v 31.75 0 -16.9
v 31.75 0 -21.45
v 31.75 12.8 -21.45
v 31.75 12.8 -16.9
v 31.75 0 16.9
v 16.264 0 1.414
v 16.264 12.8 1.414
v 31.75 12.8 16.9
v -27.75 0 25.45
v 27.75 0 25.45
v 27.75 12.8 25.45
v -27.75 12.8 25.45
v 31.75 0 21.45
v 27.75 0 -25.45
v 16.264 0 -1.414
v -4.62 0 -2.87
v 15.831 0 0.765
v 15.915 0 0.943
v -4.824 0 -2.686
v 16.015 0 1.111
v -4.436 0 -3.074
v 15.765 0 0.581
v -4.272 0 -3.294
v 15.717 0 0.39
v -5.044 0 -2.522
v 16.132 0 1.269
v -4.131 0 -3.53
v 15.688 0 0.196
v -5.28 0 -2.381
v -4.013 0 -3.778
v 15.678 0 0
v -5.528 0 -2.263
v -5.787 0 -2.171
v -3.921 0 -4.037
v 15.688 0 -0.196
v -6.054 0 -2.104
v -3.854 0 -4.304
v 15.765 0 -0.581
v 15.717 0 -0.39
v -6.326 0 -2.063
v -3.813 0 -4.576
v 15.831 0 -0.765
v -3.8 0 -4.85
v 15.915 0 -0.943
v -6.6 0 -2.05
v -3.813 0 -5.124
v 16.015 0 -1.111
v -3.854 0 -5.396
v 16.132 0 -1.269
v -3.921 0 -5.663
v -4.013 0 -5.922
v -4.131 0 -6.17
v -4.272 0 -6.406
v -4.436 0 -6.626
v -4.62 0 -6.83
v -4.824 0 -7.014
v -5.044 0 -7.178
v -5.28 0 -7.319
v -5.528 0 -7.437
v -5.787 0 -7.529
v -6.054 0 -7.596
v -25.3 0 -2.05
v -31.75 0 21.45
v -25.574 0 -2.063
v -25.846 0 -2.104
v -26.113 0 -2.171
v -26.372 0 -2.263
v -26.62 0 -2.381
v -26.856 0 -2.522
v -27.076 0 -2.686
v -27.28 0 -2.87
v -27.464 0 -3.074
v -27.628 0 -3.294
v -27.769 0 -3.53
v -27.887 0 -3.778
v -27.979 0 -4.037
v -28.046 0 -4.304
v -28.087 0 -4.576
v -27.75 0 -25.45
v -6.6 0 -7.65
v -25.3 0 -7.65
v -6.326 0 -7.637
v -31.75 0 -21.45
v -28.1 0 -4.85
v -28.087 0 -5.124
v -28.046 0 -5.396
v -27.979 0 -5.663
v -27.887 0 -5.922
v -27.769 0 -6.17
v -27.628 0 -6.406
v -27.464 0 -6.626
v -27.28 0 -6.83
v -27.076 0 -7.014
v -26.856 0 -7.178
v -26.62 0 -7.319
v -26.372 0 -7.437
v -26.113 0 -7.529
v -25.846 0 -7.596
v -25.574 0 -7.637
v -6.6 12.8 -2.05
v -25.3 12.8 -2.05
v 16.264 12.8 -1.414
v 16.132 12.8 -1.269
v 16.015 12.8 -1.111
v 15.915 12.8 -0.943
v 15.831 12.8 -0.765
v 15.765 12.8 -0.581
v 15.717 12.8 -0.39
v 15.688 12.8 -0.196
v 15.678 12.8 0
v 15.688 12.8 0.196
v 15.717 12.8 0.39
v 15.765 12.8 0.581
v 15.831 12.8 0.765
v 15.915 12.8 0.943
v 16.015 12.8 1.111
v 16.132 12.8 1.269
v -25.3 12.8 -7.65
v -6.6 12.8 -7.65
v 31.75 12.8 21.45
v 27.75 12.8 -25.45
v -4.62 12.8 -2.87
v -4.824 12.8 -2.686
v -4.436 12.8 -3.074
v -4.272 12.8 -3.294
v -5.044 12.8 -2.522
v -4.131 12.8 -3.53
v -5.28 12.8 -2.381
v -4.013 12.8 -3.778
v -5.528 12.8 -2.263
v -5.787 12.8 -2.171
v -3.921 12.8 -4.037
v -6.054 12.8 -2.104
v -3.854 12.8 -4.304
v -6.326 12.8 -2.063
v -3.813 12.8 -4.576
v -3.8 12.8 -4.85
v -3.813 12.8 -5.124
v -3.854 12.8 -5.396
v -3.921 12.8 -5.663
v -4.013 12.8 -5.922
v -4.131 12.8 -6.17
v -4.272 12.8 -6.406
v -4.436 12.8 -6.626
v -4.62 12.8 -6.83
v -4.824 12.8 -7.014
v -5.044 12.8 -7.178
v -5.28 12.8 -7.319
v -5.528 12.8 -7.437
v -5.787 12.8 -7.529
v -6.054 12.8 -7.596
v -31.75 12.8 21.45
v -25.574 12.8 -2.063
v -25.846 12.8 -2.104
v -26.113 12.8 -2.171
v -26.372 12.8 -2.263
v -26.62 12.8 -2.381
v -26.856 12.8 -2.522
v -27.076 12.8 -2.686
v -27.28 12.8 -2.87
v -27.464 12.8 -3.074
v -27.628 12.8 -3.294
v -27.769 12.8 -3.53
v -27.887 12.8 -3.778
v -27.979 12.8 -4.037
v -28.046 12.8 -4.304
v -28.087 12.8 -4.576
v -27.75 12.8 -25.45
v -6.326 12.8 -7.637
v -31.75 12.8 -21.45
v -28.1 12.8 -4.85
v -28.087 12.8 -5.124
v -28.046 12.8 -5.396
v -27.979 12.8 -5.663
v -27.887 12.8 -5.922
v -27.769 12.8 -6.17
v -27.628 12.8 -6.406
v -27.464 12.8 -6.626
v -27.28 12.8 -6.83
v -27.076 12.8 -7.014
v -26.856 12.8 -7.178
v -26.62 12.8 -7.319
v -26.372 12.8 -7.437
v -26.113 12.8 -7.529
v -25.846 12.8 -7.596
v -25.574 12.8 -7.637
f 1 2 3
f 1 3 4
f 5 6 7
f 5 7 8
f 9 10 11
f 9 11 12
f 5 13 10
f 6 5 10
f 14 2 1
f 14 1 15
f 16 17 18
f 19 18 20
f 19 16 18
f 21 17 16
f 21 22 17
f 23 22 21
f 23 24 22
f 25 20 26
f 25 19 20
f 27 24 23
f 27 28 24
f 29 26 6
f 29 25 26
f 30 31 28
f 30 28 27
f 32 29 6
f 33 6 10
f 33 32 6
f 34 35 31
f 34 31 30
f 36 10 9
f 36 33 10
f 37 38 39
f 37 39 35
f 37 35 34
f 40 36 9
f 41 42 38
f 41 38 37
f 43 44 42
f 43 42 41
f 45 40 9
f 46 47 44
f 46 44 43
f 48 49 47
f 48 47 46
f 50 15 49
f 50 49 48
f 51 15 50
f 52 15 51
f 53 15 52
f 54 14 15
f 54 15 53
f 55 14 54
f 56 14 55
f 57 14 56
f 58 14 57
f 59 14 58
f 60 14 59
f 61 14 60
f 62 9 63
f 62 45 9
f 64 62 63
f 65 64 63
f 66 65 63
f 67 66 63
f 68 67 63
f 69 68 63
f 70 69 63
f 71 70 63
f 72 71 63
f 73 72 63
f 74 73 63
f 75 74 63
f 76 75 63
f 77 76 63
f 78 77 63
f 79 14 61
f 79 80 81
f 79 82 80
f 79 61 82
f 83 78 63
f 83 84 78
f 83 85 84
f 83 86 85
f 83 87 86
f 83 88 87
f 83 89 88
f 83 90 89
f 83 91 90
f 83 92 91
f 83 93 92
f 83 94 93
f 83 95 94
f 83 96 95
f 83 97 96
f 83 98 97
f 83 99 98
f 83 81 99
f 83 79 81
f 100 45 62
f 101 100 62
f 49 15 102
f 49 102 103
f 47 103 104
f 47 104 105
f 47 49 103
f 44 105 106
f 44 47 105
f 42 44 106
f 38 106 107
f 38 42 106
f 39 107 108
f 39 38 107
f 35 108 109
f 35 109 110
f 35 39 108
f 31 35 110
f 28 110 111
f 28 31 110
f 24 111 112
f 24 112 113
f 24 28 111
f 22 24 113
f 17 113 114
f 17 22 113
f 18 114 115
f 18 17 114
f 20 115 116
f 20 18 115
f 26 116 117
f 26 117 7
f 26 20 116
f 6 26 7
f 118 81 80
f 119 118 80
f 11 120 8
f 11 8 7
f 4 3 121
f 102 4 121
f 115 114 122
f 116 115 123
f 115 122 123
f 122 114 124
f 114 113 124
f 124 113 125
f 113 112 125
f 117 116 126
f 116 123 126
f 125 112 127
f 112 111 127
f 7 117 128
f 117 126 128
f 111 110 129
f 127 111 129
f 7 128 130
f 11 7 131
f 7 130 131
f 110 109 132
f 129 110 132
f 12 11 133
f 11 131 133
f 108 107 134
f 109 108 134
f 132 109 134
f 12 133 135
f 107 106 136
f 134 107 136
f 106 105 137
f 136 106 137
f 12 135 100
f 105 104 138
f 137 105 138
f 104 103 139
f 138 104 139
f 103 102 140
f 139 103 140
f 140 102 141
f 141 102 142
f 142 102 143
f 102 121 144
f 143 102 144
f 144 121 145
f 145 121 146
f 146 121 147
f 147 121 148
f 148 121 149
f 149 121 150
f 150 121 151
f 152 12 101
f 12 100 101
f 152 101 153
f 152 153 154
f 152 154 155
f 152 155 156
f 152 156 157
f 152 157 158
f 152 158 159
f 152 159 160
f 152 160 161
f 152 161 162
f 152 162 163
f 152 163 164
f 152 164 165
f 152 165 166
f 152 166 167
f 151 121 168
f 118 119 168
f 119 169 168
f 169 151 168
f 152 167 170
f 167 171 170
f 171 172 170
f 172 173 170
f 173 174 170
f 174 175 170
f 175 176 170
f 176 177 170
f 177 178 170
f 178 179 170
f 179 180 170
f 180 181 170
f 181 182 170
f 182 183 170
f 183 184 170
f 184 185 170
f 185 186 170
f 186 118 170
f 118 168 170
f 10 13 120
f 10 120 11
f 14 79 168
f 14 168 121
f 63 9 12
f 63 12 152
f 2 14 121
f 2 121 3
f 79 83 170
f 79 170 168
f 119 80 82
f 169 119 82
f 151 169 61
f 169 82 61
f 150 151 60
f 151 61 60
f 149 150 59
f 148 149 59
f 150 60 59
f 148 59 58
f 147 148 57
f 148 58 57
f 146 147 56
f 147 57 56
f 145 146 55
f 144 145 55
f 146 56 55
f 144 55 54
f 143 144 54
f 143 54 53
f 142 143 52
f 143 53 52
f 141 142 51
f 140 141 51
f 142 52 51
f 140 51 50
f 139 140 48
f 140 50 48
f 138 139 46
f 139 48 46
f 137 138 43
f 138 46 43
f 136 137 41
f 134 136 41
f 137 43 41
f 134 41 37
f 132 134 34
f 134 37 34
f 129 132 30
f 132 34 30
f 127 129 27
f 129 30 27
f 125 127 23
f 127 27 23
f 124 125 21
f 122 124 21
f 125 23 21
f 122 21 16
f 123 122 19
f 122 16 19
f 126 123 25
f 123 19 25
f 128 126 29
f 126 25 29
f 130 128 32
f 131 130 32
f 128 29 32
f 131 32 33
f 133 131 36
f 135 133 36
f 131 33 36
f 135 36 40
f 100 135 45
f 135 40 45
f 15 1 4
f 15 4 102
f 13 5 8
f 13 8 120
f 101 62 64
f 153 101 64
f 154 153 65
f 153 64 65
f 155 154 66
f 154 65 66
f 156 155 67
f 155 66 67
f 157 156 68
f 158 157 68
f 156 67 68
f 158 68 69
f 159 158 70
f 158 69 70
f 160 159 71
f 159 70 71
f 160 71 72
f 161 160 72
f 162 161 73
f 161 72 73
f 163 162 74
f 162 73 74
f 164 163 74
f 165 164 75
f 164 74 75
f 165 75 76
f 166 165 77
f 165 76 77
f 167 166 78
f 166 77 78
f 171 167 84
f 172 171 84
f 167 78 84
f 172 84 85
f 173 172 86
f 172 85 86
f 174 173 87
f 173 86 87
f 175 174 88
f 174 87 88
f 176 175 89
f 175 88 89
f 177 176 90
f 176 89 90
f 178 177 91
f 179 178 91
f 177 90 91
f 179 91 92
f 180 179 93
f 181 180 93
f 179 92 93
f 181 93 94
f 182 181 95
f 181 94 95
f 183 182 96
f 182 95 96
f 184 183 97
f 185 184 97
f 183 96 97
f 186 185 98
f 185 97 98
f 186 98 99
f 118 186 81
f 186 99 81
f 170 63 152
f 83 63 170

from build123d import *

# Parameters (mm, degrees)
RESSALTO_EXTRUS_O2_DEPTH = 12.8


with BuildPart() as part:
    # Esboço1 → Ressalto-extrusão2 (new body)
    with BuildSketch(Plane(origin=(0, 0, 0), x_dir=(1, 0, 0), z_dir=(0, 1, 0))):
        with BuildLine():
            Line((-27.75, 25.45), (27.75, 25.45))
            Line((27.75, 25.45), (31.75, 21.45))
            Line((31.75, 21.45), (31.75, 16.9))
            Line((31.75, 16.9), (16.264213562, 1.414213562))
            ThreePointArc((16.264213562, 1.414213562), (15.678427125, 0), (16.264213562, -1.414213562))
            Line((16.264213562, -1.414213562), (31.75, -16.9))
            Line((31.75, -16.9), (31.75, -21.45))
            Line((31.75, -21.45), (27.75, -25.45))
            Line((27.75, -25.45), (-27.75, -25.45))
            Line((-27.75, -25.45), (-31.75, -21.45))
            Line((-31.75, -21.45), (-31.75, 21.45))
            Line((-31.75, 21.45), (-27.75, 25.45))
        make_face()
        with BuildLine():
            Line((-25.3, 7.65), (-6.6, 7.65))
            ThreePointArc((-6.6, 7.65), (-3.8, 4.85), (-6.6, 2.05))
            Line((-6.6, 2.05), (-25.3, 2.05))
            ThreePointArc((-25.3, 2.05), (-28.1, 4.85), (-25.3, 7.65))
        make_face(mode=Mode.SUBTRACT)
    extrude(amount=RESSALTO_EXTRUS_O2_DEPTH)


solid = part.part
